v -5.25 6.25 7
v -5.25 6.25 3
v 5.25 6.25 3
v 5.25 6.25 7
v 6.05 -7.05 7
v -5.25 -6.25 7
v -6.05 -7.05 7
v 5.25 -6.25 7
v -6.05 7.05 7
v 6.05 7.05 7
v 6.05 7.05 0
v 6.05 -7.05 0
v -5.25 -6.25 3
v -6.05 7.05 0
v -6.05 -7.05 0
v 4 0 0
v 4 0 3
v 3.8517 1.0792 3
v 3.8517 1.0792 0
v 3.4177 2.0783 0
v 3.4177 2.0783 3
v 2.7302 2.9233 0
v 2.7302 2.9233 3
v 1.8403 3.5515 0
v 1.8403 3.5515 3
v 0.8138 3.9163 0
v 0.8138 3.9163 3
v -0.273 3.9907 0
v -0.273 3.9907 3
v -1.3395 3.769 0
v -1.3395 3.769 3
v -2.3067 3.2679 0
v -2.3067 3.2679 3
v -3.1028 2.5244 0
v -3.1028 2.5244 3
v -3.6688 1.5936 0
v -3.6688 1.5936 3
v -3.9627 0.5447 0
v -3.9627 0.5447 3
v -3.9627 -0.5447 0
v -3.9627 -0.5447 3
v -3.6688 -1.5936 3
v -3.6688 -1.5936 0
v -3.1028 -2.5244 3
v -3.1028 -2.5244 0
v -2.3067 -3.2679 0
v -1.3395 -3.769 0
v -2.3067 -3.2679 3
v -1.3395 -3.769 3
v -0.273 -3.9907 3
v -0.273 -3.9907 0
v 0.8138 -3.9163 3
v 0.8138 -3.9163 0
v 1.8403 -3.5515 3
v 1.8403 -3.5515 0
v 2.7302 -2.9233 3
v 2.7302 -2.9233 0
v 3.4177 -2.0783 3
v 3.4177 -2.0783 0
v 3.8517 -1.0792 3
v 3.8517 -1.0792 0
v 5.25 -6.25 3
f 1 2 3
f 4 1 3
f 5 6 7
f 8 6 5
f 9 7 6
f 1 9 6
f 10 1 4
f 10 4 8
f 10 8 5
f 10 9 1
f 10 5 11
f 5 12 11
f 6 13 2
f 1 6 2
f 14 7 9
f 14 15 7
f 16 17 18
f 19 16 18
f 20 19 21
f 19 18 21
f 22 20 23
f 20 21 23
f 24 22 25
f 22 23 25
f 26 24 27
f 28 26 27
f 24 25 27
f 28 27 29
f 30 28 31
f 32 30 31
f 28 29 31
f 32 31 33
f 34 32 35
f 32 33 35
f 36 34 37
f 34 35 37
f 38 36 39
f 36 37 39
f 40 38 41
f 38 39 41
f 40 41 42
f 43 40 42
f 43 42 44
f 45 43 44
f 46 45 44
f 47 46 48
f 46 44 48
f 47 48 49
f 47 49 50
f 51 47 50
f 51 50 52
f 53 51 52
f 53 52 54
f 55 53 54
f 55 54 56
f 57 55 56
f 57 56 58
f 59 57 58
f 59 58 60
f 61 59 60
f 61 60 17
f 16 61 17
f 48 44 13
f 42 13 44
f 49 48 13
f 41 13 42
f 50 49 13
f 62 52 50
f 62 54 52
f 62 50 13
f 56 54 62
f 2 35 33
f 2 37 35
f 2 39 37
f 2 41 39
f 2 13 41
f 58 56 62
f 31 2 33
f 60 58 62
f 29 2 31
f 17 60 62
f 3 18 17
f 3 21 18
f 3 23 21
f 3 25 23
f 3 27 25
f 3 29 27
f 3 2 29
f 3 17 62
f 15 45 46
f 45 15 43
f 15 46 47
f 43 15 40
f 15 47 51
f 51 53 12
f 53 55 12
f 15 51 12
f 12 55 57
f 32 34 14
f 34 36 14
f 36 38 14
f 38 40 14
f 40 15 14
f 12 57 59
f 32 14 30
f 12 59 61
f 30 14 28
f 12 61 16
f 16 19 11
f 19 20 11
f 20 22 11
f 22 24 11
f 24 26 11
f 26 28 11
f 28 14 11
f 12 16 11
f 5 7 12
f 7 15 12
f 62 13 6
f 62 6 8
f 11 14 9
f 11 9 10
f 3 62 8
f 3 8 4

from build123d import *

# Parameters (mm, degrees)
SKETCH_W      = 12.1
SKETCH_H      = 14.1
PAD_DEPTH     = 3
SKETCH001_W   = 12.1
SKETCH001_H   = 14.1
SKETCH001_W_2 = 10.5
SKETCH001_H_2 = 12.5
PAD001_DEPTH  = 4
SKETCH002_R   = 4
POCKET_DEPTH  = 5


with BuildPart() as part:
    # Sketch → Pad (new body)
    with BuildSketch(Plane.XY):
        Rectangle(SKETCH_W, SKETCH_H)
    extrude(amount=PAD_DEPTH)

    # Sketch001 (on Face6 of Pad) → Pad001 (join)
    with BuildSketch(Plane.XY.offset(3)):
        Rectangle(SKETCH001_W, SKETCH001_H)
        Rectangle(SKETCH001_W_2, SKETCH001_H_2, mode=Mode.SUBTRACT)
    extrude(amount=PAD001_DEPTH)

    # Sketch002 (on Face6 of Pad001) → Pocket (cut)
    with BuildSketch(Plane.XY.offset(3)):
        Circle(SKETCH002_R)
    extrude(amount=-POCKET_DEPTH, mode=Mode.SUBTRACT)


solid = part.part
